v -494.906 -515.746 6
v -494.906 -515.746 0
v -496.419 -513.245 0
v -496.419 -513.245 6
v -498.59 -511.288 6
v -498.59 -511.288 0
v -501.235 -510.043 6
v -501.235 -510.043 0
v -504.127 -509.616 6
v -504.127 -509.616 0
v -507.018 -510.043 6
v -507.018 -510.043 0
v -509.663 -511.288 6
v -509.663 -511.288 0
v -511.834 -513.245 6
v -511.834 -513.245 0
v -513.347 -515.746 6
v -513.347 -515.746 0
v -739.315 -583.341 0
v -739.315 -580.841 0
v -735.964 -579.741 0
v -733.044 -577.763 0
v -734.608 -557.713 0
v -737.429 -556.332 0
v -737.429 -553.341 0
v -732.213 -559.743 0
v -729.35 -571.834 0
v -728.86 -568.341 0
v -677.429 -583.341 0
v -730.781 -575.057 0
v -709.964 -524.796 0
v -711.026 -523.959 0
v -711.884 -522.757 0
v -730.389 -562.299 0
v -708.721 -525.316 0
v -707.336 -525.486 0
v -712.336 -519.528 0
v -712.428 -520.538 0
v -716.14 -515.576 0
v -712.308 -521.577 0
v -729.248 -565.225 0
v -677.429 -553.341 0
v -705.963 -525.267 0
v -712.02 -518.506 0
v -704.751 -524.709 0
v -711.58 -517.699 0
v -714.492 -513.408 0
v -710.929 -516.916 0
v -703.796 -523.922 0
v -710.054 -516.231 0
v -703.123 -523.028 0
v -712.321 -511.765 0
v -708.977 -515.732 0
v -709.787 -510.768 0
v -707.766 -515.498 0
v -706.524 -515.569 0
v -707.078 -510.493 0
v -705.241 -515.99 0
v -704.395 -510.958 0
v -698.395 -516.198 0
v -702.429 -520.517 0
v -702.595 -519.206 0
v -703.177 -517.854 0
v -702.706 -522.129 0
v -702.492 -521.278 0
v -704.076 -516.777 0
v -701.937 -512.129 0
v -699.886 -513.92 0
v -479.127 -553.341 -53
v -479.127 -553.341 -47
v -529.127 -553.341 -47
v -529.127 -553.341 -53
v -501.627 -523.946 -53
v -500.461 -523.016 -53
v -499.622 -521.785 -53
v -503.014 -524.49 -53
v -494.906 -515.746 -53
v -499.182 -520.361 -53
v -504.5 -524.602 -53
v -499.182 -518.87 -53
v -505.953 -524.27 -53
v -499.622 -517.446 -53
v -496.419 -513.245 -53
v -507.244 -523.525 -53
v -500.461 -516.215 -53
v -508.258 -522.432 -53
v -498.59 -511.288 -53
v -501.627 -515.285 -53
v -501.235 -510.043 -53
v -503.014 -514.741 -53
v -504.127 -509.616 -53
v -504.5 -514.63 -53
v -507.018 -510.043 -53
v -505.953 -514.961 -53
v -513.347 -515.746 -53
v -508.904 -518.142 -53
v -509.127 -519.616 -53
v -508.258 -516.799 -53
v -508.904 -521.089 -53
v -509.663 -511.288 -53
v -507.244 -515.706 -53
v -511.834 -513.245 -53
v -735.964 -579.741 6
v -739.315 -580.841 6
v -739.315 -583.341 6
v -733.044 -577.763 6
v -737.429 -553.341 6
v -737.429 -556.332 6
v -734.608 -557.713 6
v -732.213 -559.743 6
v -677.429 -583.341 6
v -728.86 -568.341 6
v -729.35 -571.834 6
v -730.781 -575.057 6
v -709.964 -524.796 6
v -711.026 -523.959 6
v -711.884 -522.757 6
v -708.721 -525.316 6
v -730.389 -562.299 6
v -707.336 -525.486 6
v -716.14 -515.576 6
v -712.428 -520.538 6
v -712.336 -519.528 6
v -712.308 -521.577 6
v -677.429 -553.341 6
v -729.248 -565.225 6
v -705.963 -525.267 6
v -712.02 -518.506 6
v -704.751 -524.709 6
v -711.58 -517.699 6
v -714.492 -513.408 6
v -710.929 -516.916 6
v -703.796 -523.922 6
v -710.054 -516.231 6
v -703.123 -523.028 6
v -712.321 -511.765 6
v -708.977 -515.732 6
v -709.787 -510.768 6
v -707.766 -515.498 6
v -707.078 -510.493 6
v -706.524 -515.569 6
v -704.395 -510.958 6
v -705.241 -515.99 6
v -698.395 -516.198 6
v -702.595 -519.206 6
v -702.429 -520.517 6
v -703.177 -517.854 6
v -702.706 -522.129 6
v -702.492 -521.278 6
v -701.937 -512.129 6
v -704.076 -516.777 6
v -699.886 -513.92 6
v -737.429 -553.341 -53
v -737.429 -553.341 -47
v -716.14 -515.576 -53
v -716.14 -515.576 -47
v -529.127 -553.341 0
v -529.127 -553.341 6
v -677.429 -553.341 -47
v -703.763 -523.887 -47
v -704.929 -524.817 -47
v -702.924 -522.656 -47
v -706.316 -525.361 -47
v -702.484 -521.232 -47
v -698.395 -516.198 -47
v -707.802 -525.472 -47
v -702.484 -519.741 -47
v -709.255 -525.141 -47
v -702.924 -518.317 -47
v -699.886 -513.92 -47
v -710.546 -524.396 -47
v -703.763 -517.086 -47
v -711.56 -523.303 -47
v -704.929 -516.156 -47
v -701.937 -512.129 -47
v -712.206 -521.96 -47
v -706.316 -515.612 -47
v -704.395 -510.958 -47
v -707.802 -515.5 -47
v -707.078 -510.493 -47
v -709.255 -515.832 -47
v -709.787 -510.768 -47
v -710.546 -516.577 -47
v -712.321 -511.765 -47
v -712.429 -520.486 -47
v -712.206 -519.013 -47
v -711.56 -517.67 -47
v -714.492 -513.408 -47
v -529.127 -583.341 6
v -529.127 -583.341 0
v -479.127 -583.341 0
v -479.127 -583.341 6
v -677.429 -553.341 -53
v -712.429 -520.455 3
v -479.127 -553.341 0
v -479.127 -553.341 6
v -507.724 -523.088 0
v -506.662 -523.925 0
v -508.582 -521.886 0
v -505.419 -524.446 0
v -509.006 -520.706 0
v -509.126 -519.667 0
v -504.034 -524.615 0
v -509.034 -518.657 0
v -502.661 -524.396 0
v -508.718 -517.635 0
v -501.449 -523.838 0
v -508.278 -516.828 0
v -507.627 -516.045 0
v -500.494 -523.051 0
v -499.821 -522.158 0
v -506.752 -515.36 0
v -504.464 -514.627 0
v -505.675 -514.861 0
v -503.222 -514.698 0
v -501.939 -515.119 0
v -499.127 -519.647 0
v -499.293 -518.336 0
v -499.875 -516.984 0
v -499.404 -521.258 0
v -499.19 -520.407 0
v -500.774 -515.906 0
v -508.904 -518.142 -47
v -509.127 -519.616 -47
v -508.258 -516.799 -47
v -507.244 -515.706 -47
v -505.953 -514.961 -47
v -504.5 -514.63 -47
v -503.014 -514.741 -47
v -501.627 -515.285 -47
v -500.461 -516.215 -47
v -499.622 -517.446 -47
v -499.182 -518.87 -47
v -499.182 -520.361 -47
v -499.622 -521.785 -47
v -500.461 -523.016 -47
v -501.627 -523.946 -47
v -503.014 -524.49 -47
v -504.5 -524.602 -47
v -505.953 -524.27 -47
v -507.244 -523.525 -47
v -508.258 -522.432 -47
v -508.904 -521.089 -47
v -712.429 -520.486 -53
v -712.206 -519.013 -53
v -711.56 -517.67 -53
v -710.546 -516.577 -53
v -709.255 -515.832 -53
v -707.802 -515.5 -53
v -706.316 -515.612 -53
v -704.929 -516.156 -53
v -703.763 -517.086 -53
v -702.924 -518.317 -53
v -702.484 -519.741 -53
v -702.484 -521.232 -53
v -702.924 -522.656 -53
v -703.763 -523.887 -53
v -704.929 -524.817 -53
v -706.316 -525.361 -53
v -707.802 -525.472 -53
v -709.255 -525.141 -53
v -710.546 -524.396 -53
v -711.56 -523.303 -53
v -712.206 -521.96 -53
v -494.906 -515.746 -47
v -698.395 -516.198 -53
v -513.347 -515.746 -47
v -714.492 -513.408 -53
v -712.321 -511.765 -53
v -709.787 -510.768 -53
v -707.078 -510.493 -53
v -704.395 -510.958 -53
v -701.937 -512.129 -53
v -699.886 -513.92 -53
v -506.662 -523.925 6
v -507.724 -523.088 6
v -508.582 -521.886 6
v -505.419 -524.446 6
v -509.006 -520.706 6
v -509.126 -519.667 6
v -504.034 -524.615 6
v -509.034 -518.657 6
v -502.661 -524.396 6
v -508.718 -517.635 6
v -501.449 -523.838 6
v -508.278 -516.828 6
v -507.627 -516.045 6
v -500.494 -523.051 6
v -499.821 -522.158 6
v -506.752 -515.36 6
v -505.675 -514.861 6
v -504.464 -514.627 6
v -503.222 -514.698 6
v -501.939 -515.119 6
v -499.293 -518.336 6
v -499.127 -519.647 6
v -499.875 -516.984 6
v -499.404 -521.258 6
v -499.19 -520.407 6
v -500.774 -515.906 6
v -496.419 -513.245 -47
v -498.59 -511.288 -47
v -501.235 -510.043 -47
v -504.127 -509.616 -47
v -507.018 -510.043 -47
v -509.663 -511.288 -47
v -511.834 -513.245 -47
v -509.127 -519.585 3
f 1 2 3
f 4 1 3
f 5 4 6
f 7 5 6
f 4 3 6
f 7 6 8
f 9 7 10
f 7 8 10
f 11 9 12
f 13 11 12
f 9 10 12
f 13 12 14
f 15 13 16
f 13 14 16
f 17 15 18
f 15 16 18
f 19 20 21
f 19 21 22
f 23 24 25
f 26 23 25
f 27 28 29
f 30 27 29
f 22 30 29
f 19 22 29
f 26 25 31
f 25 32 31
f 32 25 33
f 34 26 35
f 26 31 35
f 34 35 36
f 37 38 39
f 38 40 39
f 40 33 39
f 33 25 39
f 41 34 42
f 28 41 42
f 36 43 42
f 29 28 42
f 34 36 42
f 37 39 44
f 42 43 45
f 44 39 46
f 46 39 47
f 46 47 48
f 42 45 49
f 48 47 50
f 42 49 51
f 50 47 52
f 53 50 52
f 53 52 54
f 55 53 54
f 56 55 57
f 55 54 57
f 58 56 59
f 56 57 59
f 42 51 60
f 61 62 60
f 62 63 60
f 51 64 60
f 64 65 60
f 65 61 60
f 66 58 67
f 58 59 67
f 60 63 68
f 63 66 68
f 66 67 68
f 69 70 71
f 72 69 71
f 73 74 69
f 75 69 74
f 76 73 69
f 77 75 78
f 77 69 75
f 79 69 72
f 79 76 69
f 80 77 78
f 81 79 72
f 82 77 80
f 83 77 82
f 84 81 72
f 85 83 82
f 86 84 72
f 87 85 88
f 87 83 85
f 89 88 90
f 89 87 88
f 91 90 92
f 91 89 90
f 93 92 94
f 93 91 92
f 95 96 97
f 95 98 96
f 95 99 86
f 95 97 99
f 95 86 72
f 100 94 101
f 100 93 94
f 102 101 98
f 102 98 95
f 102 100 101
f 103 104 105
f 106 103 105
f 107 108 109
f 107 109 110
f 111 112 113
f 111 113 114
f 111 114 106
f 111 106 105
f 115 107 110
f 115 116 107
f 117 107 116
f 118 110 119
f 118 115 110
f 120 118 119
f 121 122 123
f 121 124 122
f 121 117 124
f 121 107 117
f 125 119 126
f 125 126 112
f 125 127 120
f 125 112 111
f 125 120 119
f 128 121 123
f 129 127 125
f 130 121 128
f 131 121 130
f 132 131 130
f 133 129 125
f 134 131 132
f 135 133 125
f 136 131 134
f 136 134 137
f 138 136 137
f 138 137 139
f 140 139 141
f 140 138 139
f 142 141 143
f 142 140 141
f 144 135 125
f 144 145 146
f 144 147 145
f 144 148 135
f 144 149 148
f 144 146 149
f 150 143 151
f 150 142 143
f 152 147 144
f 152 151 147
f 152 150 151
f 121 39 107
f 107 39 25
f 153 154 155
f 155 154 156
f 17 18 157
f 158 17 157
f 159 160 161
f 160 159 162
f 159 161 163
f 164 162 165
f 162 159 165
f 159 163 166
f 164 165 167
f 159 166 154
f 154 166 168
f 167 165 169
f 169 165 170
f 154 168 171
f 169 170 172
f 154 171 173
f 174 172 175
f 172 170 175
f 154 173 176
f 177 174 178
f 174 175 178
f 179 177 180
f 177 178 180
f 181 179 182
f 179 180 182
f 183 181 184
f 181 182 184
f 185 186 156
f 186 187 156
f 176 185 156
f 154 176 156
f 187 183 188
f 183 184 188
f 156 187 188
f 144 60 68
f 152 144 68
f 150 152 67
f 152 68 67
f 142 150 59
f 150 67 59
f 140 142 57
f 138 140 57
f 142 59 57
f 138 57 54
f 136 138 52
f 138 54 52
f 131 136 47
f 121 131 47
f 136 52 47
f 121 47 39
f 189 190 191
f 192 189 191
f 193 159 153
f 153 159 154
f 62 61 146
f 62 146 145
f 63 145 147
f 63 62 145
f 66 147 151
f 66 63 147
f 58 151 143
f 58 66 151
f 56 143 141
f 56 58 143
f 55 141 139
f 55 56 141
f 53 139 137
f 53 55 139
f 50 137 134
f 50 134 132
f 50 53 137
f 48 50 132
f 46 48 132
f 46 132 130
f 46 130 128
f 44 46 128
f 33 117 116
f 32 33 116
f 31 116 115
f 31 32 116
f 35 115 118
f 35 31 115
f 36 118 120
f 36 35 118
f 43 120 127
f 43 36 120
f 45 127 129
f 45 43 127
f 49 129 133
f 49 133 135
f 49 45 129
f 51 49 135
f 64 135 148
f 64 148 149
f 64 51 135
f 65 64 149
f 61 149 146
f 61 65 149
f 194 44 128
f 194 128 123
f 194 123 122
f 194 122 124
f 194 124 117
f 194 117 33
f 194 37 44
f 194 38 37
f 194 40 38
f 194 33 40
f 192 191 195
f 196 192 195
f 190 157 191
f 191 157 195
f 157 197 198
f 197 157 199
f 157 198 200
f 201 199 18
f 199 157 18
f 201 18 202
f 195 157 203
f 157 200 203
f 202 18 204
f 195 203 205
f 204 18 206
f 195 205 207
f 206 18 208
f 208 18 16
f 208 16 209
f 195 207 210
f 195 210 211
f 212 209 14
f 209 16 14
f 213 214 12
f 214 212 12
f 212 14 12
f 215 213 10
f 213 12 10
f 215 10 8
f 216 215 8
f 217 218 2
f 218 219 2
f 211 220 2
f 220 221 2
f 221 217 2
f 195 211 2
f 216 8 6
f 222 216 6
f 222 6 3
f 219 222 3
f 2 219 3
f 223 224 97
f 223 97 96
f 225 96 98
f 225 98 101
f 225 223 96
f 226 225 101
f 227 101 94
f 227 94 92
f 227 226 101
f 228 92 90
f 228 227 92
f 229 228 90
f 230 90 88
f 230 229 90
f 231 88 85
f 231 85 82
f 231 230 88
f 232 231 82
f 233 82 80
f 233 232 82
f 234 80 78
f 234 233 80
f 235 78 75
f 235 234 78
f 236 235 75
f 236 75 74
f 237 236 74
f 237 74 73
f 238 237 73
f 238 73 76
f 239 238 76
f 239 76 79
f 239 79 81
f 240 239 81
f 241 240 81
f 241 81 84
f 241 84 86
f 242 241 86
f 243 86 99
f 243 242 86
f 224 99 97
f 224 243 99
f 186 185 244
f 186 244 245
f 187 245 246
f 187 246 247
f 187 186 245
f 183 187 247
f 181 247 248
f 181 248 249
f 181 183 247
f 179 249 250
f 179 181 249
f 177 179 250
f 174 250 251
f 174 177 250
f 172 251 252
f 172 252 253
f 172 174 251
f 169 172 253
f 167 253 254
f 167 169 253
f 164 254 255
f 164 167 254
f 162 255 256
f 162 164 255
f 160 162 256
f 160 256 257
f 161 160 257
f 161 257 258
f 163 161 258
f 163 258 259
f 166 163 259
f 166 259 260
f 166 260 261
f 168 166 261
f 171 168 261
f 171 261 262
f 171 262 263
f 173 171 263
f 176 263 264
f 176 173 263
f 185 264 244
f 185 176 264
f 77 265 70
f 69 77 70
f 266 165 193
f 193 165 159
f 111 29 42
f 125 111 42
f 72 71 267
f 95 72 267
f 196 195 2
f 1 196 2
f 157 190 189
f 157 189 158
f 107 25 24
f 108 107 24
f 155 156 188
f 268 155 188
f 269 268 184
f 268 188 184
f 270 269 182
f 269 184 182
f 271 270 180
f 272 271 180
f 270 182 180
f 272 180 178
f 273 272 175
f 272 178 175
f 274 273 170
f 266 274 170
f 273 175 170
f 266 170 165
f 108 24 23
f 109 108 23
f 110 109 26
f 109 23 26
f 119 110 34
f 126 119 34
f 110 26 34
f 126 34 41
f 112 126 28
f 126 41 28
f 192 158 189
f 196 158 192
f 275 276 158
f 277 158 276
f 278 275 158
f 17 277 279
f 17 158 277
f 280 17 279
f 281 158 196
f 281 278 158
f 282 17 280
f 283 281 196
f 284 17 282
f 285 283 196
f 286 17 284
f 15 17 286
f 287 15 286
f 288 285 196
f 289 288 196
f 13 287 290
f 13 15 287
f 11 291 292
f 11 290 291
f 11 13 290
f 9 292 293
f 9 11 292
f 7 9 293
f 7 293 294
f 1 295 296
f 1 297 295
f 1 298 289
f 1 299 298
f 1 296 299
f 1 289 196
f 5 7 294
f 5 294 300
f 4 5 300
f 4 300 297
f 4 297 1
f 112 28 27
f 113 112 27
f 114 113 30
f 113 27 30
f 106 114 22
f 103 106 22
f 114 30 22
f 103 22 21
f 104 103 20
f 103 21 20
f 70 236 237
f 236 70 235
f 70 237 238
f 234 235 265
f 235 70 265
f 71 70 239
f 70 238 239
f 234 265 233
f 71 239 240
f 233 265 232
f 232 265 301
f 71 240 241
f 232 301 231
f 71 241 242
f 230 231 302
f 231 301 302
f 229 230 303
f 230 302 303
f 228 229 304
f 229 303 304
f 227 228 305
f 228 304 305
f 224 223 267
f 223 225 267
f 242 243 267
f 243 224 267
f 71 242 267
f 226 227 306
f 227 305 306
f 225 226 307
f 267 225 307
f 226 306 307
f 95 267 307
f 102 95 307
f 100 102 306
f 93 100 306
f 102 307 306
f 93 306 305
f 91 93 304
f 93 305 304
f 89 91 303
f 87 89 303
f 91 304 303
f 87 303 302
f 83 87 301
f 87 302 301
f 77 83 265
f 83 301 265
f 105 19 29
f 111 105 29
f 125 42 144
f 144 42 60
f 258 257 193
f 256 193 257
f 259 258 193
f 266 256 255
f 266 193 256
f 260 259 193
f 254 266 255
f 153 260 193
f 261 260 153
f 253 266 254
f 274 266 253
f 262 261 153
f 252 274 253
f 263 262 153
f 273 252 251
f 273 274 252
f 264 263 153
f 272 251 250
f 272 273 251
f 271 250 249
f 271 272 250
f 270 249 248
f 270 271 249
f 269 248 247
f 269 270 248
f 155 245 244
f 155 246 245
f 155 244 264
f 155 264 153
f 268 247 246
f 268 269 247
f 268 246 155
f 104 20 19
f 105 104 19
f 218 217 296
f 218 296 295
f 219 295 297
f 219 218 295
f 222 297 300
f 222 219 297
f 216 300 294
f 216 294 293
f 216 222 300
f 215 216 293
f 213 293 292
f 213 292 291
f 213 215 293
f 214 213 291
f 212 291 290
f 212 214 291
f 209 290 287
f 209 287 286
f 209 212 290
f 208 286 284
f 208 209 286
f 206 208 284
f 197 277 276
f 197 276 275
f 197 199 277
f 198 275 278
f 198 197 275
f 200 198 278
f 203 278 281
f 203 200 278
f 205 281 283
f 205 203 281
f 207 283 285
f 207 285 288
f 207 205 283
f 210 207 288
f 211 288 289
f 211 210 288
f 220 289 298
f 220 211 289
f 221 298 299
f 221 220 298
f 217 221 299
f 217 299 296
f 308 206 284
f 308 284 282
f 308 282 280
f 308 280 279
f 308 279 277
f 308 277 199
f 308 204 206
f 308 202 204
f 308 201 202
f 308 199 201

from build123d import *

# Parameters (mm, degrees)
SKETCH1_W             = 50
SKETCH1_H             = 30
BOSS_EXTRUDE1_DEPTH   = 6
SKETCH2_R             = 5
BOSS_EXTRUDE2_DEPTH   = 6
BOSS_EXTRUDE2_2_DEPTH = 6


with BuildPart() as part:
    # Sketch1 → Boss-Extrude1 (new body)
    # profile 1 of 6: a face of its own
    with BuildSketch(Plane.XY):
        with BuildLine():
            Line((-716.139861216, -515.57575128), (-737.428628659, -553.340939136))
            Line((-737.428628659, -553.340939136), (-677.428628659, -553.340939136))
            Line((-677.428628659, -553.340939136), (-698.394613553, -516.198439056))
            ThreePointArc((-698.394613553, -516.198439056), (-697.673113525, -518.288686656), (-697.428628659, -520.486395569))
            ThreePointArc((-697.428628659, -520.486395569), (-709.967100091, -530.158839045), (-716.139861216, -515.57575128))
        make_face()
    # profile 2 of 6: a face of its own
    with BuildSketch(Plane.XY):
        with BuildLine():
            Line((-677.428628659, -553.340939136), (-737.428628659, -553.340939136))
            Line((-737.428628659, -553.340939136), (-737.428628659, -556.331866841))
            ThreePointArc((-737.428628659, -556.331866841), (-731.221893717, -560.964753297), (-728.860193105, -568.341037305))
            ThreePointArc((-728.860193105, -568.341037305), (-731.818315199, -576.488786373), (-739.314652141, -580.840939136))
            Line((-739.314652141, -580.840939136), (-739.314652141, -583.340939136))
            Line((-739.314652141, -583.340939136), (-677.428628659, -583.340939136))
            Line((-677.428628659, -583.340939136), (-677.428628659, -553.340939136))
        make_face()
    # profile 3 of 6: a face of its own
    with BuildSketch(Plane.XY):
        with BuildLine():
            ThreePointArc((-698.394613553, -516.198439056), (-707.077940535, -510.492546569), (-716.139861216, -515.57575128))
            ThreePointArc((-716.139861216, -515.57575128), (-709.967100091, -530.158839045), (-697.428628659, -520.486395569))
            ThreePointArc((-697.428628659, -520.486395569), (-697.673113525, -518.288686656), (-698.394613553, -516.198439056))
        make_face()
        with BuildLine():
            add(Edge.make_bspline(
                [(-702.428724913, -520.517420238), (-702.366675575, -510.517612746), (-712.366483068, -510.455563408), (-712.428532405, -520.4553709), (-712.490581742, -530.455178393), (-702.49077425, -530.51722773), (-702.428724913, -520.517420238)],
                knots=[0, 0, 0, 0, 0.5, 0.5, 0.5, 1, 1, 1, 1], degree=3, weights=[1, 0.333333333, 0.333333333, 1, 0.333333333, 0.333333333, 1]))
        make_face(mode=Mode.SUBTRACT)
    # profile 4 of 6: a face of its own
    with BuildSketch(Plane.XY):
        with BuildLine():
            Line((-513.347374444, -515.745502459), (-529.126603186, -553.340939136))
            Line((-529.126603186, -553.340939136), (-479.126603186, -553.340939136))
            Line((-479.126603186, -553.340939136), (-494.905831928, -515.745502459))
            ThreePointArc((-494.905831928, -515.745502459), (-494.323345754, -517.641698969), (-494.126603186, -519.615564139))
            ThreePointArc((-494.126603186, -519.615564139), (-506.100468357, -529.418821572), (-513.347374444, -515.745502459))
        make_face()
    # profile 5 of 6: a face of its own
    with BuildSketch(Plane.XY):
        with Locations((-504.126603186, -568.340939136)):
            Rectangle(SKETCH1_W, SKETCH1_H)
    # profile 6 of 6: a face of its own
    with BuildSketch(Plane.XY):
        with BuildLine():
            ThreePointArc((-494.905831928, -515.745502459), (-504.126603186, -509.615564139), (-513.347374444, -515.745502459))
            ThreePointArc((-513.347374444, -515.745502459), (-506.100468357, -529.418821572), (-494.126603186, -519.615564139))
            ThreePointArc((-494.126603186, -519.615564139), (-494.323345754, -517.641698969), (-494.905831928, -515.745502459))
        make_face()
        with BuildLine():
            add(Edge.make_bspline(
                [(-499.12669944, -519.646588808), (-499.064650103, -509.646781316), (-509.064457595, -509.584731979), (-509.126506932, -519.584539471), (-509.188556269, -529.584346963), (-499.188748777, -529.6463963), (-499.12669944, -519.646588808)],
                knots=[0, 0, 0, 0, 0.5, 0.5, 0.5, 1, 1, 1, 1], degree=3, weights=[1, 0.333333333, 0.333333333, 1, 0.333333333, 0.333333333, 1]))
        make_face(mode=Mode.SUBTRACT)
    extrude(amount=BOSS_EXTRUDE1_DEPTH)


with BuildPart() as body_2:
    # Sketch2 → Boss-Extrude2 (new body)
    with BuildSketch(Plane(origin=(0, 0, -47), x_dir=(-1, 0, 0), z_dir=(0, 0, -1))):
        with BuildLine():
            Line((677.428628659, -553.340939136), (737.428628659, -553.340939136))
            Line((737.428628659, -553.340939136), (716.139861216, -515.57575128))
            ThreePointArc((716.139861216, -515.57575128), (707.077940535, -510.492546569), (698.394613553, -516.198439056))
            Line((698.394613553, -516.198439056), (677.428628659, -553.340939136))
        make_face()
        with Locations((707.428628659, -520.486395569)):
            Circle(SKETCH2_R, mode=Mode.SUBTRACT)
    extrude(amount=BOSS_EXTRUDE2_DEPTH)


with BuildPart() as body_3:
    # Sketch2 → Boss-Extrude2 2 (new body)
    with BuildSketch(Plane(origin=(0, 0, -47), x_dir=(-1, 0, 0), z_dir=(0, 0, -1))):
        with BuildLine():
            Line((479.126603186, -553.340939136), (529.126603186, -553.340939136))
            Line((529.126603186, -553.340939136), (513.347374444, -515.745502459))
            ThreePointArc((513.347374444, -515.745502459), (504.126603186, -509.615564139), (494.905831928, -515.745502459))
            Line((494.905831928, -515.745502459), (479.126603186, -553.340939136))
        make_face()
        with Locations((504.126603186, -519.615564139)):
            Circle(SKETCH2_R, mode=Mode.SUBTRACT)
    extrude(amount=BOSS_EXTRUDE2_2_DEPTH)


solid = Compound([part.part, body_2.part, body_3.part])
